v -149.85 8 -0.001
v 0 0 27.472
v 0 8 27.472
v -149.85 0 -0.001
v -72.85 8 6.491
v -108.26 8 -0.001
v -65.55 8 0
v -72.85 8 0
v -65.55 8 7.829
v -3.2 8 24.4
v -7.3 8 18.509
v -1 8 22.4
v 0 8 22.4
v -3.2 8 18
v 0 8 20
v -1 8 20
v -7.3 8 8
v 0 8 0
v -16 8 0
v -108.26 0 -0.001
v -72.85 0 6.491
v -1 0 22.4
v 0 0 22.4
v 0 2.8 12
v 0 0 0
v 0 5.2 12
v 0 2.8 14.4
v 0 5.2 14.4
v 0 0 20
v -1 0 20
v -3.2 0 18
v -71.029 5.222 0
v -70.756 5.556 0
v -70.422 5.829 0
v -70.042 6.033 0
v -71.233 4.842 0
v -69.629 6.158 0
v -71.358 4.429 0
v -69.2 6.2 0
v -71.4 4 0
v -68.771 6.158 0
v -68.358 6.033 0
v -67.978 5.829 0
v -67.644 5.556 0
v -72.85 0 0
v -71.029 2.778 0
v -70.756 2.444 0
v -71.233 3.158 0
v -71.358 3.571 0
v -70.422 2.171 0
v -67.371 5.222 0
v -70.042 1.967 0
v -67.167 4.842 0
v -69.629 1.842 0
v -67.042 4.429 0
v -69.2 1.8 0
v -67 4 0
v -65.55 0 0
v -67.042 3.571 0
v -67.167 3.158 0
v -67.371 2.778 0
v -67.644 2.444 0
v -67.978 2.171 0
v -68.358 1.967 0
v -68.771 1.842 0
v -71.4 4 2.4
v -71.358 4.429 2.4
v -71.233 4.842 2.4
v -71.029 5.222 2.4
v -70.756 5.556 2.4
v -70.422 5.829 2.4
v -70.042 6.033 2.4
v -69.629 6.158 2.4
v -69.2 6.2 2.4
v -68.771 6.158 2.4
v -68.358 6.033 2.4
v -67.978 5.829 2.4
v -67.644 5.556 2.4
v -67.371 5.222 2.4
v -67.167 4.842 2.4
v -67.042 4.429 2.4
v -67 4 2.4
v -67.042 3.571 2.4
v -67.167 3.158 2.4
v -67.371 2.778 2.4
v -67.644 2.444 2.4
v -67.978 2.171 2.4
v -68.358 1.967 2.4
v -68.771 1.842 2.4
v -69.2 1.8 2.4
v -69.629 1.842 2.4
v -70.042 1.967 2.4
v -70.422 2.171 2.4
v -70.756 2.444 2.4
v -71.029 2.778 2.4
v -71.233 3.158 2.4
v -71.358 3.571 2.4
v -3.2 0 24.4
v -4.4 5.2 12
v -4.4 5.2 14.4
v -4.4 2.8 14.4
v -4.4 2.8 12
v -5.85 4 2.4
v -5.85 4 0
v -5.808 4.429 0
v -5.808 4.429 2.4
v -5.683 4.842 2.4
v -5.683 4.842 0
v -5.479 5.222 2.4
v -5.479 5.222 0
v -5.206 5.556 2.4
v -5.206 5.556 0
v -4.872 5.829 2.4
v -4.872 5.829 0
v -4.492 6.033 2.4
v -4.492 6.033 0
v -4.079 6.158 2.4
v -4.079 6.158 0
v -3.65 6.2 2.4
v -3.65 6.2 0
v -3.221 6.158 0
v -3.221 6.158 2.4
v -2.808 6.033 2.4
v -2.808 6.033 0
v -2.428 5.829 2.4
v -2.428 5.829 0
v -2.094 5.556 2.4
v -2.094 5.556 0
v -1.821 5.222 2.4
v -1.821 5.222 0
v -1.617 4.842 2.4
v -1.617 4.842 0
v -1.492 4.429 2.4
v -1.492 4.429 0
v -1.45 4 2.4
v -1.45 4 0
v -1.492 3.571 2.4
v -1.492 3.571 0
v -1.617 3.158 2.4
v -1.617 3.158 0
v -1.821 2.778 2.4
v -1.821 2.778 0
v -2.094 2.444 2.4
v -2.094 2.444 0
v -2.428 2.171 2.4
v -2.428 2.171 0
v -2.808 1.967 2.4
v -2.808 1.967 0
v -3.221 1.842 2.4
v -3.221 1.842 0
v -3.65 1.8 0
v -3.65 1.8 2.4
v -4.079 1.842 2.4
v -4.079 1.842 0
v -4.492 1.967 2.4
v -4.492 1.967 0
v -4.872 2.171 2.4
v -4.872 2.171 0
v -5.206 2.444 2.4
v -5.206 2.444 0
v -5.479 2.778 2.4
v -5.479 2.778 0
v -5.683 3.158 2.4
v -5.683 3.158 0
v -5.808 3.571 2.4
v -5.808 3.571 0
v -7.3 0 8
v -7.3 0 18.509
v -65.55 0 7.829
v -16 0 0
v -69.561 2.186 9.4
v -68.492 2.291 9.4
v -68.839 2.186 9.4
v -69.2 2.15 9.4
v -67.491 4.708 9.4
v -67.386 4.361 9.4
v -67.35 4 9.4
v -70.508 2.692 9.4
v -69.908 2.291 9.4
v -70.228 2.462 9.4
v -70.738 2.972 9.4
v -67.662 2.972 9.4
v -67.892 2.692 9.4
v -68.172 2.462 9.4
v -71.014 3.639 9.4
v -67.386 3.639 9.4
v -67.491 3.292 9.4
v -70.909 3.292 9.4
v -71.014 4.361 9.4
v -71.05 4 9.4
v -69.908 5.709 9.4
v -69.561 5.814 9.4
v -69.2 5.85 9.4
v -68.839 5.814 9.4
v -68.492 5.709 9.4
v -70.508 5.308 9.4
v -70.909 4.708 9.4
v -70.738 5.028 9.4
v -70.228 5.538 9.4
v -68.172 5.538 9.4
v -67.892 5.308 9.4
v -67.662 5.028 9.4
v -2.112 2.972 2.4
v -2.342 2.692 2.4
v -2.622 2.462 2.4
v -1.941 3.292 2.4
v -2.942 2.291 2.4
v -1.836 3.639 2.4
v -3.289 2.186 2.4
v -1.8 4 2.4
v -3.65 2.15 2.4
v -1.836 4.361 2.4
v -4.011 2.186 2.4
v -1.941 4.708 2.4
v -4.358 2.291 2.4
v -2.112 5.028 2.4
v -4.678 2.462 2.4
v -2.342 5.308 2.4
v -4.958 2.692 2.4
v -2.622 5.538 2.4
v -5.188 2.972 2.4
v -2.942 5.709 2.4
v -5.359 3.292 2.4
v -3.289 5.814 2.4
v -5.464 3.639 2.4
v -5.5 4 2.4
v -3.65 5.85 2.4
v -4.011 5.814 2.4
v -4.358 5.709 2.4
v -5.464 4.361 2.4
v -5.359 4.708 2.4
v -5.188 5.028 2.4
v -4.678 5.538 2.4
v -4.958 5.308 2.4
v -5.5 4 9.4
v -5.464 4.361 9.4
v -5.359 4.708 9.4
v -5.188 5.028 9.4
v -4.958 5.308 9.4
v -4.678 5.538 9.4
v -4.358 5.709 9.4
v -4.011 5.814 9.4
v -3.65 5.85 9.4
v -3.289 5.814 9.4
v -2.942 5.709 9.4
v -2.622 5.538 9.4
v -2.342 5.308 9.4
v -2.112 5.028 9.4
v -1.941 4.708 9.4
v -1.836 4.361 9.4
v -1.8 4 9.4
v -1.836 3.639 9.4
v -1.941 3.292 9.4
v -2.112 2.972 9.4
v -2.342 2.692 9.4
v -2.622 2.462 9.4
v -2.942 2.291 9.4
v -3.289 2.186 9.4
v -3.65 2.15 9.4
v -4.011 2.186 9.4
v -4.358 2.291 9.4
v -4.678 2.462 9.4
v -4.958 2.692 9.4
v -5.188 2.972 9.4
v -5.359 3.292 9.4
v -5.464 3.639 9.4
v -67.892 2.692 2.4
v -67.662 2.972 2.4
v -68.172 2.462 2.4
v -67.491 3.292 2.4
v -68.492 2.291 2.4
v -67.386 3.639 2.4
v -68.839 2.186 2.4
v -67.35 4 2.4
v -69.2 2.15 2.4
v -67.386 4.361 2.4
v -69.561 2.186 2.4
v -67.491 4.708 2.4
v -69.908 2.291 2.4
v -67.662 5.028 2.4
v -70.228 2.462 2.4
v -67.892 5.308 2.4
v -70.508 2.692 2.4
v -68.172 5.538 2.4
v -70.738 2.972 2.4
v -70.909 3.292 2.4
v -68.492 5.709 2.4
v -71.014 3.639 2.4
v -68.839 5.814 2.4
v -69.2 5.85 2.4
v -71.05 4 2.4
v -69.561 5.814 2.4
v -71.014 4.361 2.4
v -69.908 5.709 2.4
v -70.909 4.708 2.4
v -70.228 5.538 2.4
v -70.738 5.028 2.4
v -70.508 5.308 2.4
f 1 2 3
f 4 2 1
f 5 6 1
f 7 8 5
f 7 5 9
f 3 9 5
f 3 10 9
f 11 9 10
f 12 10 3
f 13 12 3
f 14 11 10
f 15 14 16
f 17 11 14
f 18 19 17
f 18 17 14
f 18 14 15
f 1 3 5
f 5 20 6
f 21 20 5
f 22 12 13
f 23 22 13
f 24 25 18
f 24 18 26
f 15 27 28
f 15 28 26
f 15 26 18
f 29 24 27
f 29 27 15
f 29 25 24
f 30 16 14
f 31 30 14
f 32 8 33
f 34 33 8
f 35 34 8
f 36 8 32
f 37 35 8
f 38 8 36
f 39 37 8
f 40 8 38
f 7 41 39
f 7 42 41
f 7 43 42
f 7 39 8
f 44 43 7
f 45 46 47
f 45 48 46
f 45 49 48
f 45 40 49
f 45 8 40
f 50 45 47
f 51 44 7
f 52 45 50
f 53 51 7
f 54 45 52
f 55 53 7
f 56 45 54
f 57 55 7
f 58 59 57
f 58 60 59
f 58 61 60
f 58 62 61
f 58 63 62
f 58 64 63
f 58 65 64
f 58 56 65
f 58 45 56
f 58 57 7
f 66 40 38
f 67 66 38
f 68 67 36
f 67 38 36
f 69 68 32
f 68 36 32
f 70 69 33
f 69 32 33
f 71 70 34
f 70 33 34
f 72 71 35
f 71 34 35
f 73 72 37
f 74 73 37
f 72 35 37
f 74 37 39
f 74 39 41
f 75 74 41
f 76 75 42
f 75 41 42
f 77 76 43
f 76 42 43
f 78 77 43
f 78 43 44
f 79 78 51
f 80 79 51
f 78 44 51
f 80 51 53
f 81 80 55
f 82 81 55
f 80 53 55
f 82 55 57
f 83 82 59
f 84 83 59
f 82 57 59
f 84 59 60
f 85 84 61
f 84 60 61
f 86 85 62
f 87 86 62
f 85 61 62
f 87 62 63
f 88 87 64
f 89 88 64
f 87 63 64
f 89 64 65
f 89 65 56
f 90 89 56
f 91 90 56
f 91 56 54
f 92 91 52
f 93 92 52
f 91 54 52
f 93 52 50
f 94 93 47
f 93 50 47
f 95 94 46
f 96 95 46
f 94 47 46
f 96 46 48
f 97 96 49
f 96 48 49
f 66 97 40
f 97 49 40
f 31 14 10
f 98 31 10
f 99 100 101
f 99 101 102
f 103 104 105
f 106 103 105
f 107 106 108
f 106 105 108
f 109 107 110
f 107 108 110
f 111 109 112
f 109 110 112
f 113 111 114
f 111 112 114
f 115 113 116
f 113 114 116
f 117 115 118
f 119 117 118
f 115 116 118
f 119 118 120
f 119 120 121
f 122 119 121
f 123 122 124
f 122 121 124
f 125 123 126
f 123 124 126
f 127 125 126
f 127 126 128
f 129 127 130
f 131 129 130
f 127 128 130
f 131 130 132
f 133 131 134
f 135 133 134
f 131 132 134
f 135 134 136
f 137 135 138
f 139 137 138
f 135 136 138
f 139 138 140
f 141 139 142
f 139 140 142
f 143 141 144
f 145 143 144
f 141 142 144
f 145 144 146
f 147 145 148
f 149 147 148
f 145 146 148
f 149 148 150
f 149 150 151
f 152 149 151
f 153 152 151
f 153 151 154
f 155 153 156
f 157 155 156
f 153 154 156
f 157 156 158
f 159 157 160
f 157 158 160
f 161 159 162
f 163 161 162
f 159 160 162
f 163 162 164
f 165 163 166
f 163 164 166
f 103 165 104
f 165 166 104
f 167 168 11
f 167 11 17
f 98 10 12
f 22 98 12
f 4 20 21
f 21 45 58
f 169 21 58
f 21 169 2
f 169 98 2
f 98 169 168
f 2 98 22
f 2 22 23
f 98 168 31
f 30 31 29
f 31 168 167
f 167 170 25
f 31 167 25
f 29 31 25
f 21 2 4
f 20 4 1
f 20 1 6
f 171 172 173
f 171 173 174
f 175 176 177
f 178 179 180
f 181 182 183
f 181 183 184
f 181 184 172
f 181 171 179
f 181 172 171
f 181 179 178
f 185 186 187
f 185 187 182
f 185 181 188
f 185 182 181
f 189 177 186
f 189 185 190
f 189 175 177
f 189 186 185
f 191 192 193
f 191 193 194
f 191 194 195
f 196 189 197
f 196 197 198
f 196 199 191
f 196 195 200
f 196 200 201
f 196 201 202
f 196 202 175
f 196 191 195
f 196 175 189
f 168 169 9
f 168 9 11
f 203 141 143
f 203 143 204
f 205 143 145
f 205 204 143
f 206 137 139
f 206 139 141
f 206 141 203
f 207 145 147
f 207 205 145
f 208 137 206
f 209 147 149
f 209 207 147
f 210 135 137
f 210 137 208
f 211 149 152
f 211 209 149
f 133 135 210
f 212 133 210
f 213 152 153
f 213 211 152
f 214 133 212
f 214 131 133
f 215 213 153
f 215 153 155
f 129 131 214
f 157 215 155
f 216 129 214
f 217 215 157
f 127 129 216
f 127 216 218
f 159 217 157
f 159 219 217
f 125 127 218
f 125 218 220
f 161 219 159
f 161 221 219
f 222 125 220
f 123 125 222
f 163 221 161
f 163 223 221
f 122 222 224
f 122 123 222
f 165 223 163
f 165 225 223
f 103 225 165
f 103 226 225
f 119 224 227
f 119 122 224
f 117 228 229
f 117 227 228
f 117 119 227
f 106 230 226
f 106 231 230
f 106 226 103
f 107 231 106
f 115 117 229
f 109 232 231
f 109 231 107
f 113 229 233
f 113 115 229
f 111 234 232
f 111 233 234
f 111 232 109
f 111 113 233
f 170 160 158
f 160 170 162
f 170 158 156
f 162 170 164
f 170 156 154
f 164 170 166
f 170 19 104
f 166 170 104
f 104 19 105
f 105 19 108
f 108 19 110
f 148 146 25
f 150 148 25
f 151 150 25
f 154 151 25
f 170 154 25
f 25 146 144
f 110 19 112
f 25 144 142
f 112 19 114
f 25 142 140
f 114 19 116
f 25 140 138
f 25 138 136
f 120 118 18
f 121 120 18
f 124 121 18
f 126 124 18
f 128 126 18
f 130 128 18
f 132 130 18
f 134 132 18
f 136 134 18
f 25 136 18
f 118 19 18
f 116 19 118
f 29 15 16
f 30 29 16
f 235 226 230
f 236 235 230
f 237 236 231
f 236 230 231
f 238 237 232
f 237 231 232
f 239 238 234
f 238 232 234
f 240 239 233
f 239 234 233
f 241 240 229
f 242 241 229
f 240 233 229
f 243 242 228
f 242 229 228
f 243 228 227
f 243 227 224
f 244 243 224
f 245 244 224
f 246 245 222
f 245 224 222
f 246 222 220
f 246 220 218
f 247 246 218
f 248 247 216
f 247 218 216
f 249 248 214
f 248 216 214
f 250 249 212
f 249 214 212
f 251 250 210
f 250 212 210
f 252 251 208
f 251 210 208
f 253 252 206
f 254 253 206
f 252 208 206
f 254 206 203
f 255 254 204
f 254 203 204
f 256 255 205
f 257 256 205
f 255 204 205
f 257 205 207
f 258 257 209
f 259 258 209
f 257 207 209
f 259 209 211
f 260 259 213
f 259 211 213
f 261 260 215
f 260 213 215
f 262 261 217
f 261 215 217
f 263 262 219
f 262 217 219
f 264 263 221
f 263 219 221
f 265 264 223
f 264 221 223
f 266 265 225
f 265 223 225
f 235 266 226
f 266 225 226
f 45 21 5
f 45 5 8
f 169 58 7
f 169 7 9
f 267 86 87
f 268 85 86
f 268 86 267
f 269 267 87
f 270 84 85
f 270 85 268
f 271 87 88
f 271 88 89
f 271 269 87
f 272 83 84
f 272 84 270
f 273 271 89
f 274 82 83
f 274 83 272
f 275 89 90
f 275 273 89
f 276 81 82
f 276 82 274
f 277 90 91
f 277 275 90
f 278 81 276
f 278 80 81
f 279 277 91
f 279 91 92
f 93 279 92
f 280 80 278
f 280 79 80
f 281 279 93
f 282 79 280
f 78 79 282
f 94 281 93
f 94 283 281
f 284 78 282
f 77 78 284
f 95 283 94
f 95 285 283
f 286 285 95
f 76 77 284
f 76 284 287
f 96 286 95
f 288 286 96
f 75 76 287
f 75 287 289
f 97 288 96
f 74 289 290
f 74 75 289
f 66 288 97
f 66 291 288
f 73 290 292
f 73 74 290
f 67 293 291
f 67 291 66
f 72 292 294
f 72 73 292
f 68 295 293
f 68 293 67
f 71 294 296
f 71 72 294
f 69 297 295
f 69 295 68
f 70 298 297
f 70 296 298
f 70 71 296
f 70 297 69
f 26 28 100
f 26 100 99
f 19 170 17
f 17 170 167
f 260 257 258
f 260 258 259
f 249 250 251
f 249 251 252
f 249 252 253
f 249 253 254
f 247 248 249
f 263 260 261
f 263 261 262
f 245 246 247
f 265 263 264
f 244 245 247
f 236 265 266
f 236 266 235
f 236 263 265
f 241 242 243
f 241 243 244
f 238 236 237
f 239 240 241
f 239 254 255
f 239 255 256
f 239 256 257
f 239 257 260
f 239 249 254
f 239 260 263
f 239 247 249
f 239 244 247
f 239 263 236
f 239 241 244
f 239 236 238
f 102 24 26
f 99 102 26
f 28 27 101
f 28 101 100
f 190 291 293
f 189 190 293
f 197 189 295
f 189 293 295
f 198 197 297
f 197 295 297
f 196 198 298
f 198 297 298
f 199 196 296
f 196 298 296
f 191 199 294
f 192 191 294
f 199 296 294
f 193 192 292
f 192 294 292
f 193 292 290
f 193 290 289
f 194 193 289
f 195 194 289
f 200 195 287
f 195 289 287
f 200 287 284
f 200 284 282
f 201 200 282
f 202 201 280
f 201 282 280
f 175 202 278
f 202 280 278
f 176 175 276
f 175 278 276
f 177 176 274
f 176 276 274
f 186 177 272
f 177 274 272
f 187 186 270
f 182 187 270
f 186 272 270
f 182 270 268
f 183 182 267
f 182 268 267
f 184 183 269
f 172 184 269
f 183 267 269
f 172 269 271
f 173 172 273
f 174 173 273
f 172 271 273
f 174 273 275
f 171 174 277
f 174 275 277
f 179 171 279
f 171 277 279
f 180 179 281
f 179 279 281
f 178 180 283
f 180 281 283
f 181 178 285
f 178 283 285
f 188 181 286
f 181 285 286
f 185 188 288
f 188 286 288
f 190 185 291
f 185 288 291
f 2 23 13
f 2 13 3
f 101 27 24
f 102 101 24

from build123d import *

# Parameters (mm, degrees)
P_IDAT_VYSUNUT_M1_DEPTH  = 8
ODEBRAT_VYSUNUT_M1_DEPTH = 153.557332159
SKICA5_W                 = 16
SKICA5_H                 = 8
P_IDAT_VYSUNUT_M2_DEPTH  = 8
ODEBRAT_VYSUNUT_M4_DEPTH = 153.557332159
SKICA4_W                 = 2.4
SKICA4_H                 = 2.4
ODEBRAT_VYSUNUT_M2_DEPTH = 4.4
SKICA9_R                 = 2.2
ODEBRAT_VYSUNUT_M5_DEPTH = 2.4
SKICA10_R                = 1.85
ODEBRAT_VYSUNUT_M6_DEPTH = 7


with BuildPart() as part:
    # Skica2 → Přidat vysunutím1 (new body)
    with BuildSketch(Plane(origin=(0, 0, 0), x_dir=(1, 0, 0), z_dir=(0, 1, 0))):
        Polygon((0, 0), (0, -27.47211487), (-149.85, 0.000769495), (-108.259653873, 0.000769495), (-72.85, -6.491091207), (-72.85, 0), (-65.55, 0), (-65.55, -7.829443265), (-7.3, -18.508759343), (-7.3, 0), align=None)
    extrude(amount=P_IDAT_VYSUNUT_M1_DEPTH)

    # Skica3 → Odebrat vysunutím1 (cut, through all)
    with BuildSketch(Plane(origin=(0, 8, 0), x_dir=(1, 0, 0), z_dir=(0, 1, 0))):
        Polygon((0, -20), (-1, -20), (-3.2, -18), (-3.2, -24.4), (-1, -22.4), (0, -22.4), align=None)
    extrude(amount=-ODEBRAT_VYSUNUT_M1_DEPTH, mode=Mode.SUBTRACT)

    # Skica5 → Přidat vysunutím2 (add)
    with BuildSketch(Plane(origin=(0, 8, 0), x_dir=(1, 0, 0), z_dir=(0, 1, 0))):
        with Locations((-8, -4)):
            Rectangle(SKICA5_W, SKICA5_H)
    extrude(amount=-P_IDAT_VYSUNUT_M2_DEPTH)

    # Skica7 → Odebrat vysunutím4 (cut, through all)
    with BuildSketch(Plane.XZ):
        Polygon((-7.3, 8), (-16, 8), (-16, 0), align=None)
    extrude(amount=-ODEBRAT_VYSUNUT_M4_DEPTH, mode=Mode.SUBTRACT)

    # Skica4 → Odebrat vysunutím2 (cut)
    with BuildSketch(Plane(origin=(0, 0, 0), x_dir=(0, 0, -1), z_dir=(1, 0, 0))):
        with Locations((-13.2, 4)):
            Rectangle(SKICA4_W, SKICA4_H)
    extrude(amount=-ODEBRAT_VYSUNUT_M2_DEPTH, mode=Mode.SUBTRACT)

    # Skica9 → Odebrat vysunutím5 (cut)
    with BuildSketch(Plane(origin=(0, 0, 0), x_dir=(-1, 0, 0), z_dir=(0, 0, -1))):
        with Locations((3.65, 4)):
            Circle(SKICA9_R)
        with Locations((69.2, 4)):
            Circle(SKICA9_R)
    extrude(amount=-ODEBRAT_VYSUNUT_M5_DEPTH, mode=Mode.SUBTRACT)

    # Skica10 → Odebrat vysunutím6 (cut)
    with BuildSketch(Plane(origin=(0, 0, 2.4), x_dir=(-1, 0, 0), z_dir=(0, 0, -1))):
        with Locations((3.65, 4)):
            Circle(SKICA10_R)
        with Locations((69.2, 4)):
            Circle(SKICA10_R)
    extrude(amount=-ODEBRAT_VYSUNUT_M6_DEPTH, mode=Mode.SUBTRACT)


solid = part.part
